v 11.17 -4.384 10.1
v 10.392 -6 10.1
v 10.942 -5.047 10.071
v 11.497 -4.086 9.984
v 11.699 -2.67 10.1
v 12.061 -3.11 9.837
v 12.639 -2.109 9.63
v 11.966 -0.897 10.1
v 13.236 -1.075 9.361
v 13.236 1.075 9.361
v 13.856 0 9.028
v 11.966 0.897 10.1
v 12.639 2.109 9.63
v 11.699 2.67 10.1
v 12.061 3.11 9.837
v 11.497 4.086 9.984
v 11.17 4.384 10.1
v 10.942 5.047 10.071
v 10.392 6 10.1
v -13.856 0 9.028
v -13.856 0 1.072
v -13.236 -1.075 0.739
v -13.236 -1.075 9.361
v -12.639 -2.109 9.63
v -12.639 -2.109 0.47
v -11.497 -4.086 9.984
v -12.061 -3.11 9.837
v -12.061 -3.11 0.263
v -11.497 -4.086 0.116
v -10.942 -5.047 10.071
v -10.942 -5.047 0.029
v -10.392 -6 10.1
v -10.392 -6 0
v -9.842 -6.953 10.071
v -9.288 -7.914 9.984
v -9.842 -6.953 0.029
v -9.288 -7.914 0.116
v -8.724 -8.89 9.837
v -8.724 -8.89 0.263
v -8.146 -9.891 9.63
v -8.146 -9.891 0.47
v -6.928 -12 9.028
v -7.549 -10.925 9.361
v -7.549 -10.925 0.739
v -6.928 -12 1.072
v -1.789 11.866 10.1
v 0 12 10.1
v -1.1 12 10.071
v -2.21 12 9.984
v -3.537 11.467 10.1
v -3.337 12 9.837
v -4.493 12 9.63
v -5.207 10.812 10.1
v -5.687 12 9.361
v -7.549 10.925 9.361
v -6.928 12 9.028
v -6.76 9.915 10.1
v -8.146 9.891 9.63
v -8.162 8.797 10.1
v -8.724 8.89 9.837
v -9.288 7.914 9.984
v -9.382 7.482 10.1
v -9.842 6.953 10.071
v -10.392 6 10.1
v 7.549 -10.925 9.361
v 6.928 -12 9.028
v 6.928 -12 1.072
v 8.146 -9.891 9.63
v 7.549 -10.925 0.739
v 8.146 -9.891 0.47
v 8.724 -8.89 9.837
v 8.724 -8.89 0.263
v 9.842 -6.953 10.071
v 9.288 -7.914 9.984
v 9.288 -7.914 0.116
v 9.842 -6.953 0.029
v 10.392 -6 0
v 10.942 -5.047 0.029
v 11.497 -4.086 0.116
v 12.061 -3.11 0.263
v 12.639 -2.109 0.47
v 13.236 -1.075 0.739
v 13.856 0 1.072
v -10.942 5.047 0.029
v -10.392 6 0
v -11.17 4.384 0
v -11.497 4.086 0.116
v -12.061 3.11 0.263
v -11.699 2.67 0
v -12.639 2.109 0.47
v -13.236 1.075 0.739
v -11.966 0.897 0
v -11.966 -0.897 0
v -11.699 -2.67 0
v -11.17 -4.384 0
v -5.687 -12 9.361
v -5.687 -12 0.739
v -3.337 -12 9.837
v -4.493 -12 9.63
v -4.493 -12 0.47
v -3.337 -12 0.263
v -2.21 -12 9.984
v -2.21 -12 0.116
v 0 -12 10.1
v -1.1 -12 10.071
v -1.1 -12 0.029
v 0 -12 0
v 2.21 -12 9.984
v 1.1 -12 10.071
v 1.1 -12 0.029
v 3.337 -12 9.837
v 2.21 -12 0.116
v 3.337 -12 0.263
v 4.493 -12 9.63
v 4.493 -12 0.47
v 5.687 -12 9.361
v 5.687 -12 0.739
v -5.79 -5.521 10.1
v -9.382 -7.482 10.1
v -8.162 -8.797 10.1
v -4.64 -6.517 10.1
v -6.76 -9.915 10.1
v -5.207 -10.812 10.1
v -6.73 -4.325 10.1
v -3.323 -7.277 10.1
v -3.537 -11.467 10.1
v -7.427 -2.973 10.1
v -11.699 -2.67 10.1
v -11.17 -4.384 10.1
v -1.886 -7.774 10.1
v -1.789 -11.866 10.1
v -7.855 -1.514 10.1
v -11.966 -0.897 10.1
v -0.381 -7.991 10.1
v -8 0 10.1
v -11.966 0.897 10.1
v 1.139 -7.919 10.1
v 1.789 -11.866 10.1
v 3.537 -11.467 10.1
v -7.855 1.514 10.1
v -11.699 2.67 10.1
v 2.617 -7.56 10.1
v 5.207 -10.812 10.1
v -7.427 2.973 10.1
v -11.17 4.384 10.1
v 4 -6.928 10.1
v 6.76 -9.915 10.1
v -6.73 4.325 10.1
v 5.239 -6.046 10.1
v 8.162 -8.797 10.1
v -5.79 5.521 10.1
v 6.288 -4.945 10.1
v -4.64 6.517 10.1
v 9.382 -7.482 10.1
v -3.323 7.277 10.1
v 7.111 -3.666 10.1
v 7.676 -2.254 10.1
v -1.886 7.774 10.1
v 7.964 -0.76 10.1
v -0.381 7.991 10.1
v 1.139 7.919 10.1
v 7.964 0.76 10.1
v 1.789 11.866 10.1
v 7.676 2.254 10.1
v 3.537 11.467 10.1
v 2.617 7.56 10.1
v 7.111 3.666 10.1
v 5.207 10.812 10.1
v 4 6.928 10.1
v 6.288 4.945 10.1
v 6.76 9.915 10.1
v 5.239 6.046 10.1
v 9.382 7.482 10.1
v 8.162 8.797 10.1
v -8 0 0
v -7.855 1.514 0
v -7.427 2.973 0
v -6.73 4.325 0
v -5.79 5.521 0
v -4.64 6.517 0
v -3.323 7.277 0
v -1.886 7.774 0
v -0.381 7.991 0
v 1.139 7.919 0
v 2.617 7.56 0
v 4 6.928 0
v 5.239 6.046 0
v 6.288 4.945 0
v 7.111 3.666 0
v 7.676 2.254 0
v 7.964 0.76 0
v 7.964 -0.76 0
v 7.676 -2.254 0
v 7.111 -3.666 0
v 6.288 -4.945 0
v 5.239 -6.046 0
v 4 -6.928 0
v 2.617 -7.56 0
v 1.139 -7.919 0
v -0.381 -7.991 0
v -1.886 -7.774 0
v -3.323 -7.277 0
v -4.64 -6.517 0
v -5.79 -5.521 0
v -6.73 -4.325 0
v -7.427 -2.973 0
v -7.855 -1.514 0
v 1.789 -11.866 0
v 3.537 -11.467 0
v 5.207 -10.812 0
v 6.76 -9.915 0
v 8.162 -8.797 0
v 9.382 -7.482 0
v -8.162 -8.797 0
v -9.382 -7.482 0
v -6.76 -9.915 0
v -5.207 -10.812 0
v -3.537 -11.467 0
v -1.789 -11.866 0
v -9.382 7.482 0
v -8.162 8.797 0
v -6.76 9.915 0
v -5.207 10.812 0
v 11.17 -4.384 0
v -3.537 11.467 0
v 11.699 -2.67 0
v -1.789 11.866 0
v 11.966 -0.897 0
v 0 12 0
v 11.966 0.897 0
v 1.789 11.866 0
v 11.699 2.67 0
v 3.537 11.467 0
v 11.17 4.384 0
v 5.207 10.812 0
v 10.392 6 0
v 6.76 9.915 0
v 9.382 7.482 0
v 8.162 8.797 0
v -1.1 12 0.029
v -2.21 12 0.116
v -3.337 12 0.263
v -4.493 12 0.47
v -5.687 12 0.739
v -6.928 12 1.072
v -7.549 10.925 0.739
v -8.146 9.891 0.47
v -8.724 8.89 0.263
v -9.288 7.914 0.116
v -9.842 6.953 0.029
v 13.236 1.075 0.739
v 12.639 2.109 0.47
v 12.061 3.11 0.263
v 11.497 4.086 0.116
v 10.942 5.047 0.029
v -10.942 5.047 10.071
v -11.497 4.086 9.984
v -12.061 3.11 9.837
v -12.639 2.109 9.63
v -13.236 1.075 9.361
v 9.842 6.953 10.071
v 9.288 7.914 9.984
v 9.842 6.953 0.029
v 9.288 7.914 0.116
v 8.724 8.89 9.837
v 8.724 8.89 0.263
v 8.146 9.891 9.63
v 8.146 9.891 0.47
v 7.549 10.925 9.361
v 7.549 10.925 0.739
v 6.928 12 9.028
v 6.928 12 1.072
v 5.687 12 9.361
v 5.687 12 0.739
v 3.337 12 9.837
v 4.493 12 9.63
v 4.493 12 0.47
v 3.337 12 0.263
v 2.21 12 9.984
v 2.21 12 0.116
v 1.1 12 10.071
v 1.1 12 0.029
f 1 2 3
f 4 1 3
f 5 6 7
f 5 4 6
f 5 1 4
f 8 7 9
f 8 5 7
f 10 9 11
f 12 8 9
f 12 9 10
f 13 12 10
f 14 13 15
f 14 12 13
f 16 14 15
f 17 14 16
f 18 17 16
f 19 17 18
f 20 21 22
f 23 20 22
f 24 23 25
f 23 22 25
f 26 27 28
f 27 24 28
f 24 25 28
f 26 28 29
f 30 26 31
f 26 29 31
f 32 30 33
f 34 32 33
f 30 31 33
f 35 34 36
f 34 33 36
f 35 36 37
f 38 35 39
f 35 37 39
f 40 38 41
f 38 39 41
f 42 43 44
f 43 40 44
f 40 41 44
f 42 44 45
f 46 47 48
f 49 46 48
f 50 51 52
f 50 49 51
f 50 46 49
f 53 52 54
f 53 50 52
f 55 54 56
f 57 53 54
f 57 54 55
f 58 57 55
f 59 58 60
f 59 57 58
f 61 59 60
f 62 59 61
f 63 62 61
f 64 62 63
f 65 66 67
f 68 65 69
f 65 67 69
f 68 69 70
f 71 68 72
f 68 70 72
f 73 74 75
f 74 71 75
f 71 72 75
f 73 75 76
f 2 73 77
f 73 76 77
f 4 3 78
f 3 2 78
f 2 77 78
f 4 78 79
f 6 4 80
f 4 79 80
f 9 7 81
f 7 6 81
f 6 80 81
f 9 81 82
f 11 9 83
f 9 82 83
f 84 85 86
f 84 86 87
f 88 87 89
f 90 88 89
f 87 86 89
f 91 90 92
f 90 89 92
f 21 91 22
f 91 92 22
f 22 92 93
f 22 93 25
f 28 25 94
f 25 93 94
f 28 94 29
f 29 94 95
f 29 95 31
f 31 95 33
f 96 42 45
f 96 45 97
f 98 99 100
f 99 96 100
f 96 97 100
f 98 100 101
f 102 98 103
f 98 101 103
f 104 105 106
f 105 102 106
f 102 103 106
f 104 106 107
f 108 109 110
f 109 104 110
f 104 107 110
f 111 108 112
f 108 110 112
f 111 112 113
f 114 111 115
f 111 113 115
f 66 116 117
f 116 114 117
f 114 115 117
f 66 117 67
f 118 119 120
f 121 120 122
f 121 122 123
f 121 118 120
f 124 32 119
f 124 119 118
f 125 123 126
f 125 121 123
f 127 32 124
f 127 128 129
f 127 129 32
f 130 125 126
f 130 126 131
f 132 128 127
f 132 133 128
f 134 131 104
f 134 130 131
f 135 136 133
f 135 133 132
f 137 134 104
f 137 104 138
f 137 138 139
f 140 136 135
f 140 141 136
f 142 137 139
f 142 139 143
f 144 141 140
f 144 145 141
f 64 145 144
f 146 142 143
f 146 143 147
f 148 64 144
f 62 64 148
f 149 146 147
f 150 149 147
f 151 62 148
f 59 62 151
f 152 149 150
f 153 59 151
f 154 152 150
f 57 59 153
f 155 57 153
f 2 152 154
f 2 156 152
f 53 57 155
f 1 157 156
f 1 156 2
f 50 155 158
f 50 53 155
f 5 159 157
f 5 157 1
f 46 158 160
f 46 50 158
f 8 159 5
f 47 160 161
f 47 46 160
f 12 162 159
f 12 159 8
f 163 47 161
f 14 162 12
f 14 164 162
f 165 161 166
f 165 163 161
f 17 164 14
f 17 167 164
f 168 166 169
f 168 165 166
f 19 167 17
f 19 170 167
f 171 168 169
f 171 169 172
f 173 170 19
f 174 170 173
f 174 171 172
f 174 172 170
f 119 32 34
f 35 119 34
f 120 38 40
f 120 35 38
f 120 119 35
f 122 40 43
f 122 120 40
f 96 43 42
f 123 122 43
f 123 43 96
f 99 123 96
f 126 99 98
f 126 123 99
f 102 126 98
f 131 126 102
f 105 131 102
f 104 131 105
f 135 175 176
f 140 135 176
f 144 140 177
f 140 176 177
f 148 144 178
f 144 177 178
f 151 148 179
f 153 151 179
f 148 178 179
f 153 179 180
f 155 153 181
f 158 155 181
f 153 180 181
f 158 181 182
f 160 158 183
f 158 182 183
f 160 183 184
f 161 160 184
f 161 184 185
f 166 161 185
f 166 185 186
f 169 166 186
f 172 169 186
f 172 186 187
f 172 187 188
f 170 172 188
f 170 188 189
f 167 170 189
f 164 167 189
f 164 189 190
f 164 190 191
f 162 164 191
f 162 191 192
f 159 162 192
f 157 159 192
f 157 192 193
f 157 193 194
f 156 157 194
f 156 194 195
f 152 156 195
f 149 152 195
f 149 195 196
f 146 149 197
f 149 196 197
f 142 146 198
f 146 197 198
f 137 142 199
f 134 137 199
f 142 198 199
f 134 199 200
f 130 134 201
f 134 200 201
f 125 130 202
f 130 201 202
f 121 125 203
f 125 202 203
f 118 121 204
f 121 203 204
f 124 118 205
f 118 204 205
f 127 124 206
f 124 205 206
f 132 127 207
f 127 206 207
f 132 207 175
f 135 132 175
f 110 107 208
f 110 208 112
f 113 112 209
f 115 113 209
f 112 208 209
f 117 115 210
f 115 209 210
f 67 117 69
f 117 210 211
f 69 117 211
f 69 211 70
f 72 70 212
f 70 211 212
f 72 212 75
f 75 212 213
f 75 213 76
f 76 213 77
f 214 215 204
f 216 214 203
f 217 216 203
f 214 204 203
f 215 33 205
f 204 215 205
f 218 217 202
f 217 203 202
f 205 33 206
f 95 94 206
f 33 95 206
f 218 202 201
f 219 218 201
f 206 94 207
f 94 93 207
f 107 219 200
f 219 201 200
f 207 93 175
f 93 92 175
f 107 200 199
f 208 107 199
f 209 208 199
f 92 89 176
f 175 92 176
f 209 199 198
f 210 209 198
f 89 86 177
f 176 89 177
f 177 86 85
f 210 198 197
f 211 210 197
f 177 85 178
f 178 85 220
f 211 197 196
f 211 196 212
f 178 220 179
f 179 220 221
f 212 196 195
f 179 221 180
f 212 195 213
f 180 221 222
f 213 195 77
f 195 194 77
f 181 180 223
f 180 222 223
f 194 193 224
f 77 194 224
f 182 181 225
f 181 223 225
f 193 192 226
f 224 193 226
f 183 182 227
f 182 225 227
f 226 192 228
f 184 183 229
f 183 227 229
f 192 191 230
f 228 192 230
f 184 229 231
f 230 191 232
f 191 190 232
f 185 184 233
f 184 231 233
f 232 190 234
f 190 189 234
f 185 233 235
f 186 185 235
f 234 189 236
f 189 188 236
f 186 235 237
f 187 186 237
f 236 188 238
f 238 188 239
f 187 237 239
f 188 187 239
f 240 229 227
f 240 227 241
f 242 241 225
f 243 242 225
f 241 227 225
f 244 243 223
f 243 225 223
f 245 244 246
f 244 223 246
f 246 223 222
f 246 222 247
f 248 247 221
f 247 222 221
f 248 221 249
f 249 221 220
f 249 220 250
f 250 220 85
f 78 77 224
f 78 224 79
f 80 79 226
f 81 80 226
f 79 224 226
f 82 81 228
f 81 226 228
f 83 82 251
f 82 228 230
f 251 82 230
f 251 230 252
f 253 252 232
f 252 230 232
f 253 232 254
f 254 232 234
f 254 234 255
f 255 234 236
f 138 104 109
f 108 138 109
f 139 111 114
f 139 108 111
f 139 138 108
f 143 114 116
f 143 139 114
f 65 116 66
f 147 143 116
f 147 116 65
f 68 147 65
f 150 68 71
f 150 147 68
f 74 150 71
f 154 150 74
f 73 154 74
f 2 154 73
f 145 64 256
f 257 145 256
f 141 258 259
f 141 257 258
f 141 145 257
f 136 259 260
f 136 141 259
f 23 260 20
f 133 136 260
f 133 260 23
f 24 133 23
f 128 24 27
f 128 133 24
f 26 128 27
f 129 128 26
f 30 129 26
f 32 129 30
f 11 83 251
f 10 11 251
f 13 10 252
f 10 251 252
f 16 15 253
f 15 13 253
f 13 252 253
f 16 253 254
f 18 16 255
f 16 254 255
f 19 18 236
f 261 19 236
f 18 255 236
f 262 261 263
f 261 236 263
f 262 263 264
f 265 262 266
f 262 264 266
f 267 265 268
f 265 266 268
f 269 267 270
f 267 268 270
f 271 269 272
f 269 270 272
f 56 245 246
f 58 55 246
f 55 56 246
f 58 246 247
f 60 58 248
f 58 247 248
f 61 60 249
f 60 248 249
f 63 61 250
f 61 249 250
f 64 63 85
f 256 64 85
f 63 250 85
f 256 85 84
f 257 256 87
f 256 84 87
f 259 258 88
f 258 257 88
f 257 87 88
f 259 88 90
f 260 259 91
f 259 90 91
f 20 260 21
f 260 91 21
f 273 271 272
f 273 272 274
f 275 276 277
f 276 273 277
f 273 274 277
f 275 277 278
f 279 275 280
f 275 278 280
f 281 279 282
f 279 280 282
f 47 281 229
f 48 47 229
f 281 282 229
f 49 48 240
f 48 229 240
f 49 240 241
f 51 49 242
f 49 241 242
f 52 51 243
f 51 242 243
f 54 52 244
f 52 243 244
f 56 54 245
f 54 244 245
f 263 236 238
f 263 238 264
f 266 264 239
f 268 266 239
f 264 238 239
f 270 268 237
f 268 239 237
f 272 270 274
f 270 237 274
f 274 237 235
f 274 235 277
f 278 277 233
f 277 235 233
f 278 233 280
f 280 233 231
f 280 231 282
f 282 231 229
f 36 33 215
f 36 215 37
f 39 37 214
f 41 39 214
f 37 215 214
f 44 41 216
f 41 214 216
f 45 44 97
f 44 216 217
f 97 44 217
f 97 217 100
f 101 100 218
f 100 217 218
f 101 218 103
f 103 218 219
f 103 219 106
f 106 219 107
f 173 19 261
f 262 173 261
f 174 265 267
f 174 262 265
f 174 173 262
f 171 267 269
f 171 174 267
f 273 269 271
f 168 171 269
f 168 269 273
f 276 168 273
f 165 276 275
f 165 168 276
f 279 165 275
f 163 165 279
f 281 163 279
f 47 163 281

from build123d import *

# Parameters (mm, degrees)
BOSS_EXTRUDE1_DEPTH = 10.1
SKETCH2_OUTSIDE_W   = 113.28
SKETCH2_OUTSIDE_H   = 109.568
SKETCH2_OUTSIDE_R   = 12
CUT_EXTRUDE1_DEPTH  = 21.928688444
CUT_EXTRUDE1_DRAFT  = -60
SKETCH8_R           = 8
CUT_EXTRUDE4_DEPTH  = 21.928688444
SKETCH9_OUTSIDE_W   = 113.28
SKETCH9_OUTSIDE_H   = 109.568
SKETCH9_OUTSIDE_R   = 12
CUT_EXTRUDE6_DEPTH  = 21.928688444
CUT_EXTRUDE6_DRAFT  = 60


with BuildPart() as part:
    # Sketch1 → Boss-Extrude1 (new body)
    with BuildSketch(Plane.XY):
        Polygon((13.856406461, 0), (6.92820323, 12), (-6.92820323, 12), (-13.856406461, 0), (-6.92820323, -12), (6.92820323, -12), align=None)
    extrude(amount=BOSS_EXTRUDE1_DEPTH)


with BuildPart() as cut_extrude1_tool:
    # Sketch2 outside → Cut-Extrude1 (with draft: the straight prism first)
    with BuildSketch(Plane.XY.offset(10.1)):
        Rectangle(SKETCH2_OUTSIDE_W, SKETCH2_OUTSIDE_H)
        Circle(SKETCH2_OUTSIDE_R, mode=Mode.SUBTRACT)
    extrude(amount=-CUT_EXTRUDE1_DEPTH)
    # Cut-Extrude1: the draft: its side faces are tilted about the plane it starts from
    cut_extrude1_sides = [cut_extrude1_tool.faces().sort_by_distance(p)[0] for p in [
        (0, -54.784, -0.864344222),
        (56.64, 0, -0.864344222),
        (0, 54.784, -0.864344222),
        (-56.64, 0, -0.864344222),
        (-12, 0, -0.864344222),
    ]]
    draft(cut_extrude1_sides, Plane.XY.offset(10.1), CUT_EXTRUDE1_DRAFT)


with BuildPart() as part_1:
    add(part.part)

    # Cut-Extrude1: cut by cut_extrude1_tool
    add(cut_extrude1_tool.part, mode=Mode.SUBTRACT)

    # Sketch8 → Cut-Extrude4 (cut, through all)
    with BuildSketch(Plane(origin=(0, 0, 0), x_dir=(-1, 0, 0), z_dir=(0, 0, -1))):
        Circle(SKETCH8_R)
    extrude(amount=-CUT_EXTRUDE4_DEPTH, mode=Mode.SUBTRACT)


with BuildPart() as cut_extrude6_tool:
    # Sketch9 outside → Cut-Extrude6 (with draft: the straight prism first)
    with BuildSketch(Plane.XY):
        Rectangle(SKETCH9_OUTSIDE_W, SKETCH9_OUTSIDE_H)
        Circle(SKETCH9_OUTSIDE_R, mode=Mode.SUBTRACT)
    extrude(amount=CUT_EXTRUDE6_DEPTH)
    # Cut-Extrude6: the draft: its side faces are tilted about the plane it starts from
    cut_extrude6_sides = [cut_extrude6_tool.faces().sort_by_distance(p)[0] for p in [
        (0, -54.784, 10.964344222),
        (56.64, 0, 10.964344222),
        (0, 54.784, 10.964344222),
        (-56.64, 0, 10.964344222),
        (-12, 0, 10.964344222),
    ]]
    draft(cut_extrude6_sides, Plane.XY, CUT_EXTRUDE6_DRAFT)


with BuildPart() as part_2:
    add(part_1.part)

    # Cut-Extrude6: cut by cut_extrude6_tool
    add(cut_extrude6_tool.part, mode=Mode.SUBTRACT)


solid = part_2.part
